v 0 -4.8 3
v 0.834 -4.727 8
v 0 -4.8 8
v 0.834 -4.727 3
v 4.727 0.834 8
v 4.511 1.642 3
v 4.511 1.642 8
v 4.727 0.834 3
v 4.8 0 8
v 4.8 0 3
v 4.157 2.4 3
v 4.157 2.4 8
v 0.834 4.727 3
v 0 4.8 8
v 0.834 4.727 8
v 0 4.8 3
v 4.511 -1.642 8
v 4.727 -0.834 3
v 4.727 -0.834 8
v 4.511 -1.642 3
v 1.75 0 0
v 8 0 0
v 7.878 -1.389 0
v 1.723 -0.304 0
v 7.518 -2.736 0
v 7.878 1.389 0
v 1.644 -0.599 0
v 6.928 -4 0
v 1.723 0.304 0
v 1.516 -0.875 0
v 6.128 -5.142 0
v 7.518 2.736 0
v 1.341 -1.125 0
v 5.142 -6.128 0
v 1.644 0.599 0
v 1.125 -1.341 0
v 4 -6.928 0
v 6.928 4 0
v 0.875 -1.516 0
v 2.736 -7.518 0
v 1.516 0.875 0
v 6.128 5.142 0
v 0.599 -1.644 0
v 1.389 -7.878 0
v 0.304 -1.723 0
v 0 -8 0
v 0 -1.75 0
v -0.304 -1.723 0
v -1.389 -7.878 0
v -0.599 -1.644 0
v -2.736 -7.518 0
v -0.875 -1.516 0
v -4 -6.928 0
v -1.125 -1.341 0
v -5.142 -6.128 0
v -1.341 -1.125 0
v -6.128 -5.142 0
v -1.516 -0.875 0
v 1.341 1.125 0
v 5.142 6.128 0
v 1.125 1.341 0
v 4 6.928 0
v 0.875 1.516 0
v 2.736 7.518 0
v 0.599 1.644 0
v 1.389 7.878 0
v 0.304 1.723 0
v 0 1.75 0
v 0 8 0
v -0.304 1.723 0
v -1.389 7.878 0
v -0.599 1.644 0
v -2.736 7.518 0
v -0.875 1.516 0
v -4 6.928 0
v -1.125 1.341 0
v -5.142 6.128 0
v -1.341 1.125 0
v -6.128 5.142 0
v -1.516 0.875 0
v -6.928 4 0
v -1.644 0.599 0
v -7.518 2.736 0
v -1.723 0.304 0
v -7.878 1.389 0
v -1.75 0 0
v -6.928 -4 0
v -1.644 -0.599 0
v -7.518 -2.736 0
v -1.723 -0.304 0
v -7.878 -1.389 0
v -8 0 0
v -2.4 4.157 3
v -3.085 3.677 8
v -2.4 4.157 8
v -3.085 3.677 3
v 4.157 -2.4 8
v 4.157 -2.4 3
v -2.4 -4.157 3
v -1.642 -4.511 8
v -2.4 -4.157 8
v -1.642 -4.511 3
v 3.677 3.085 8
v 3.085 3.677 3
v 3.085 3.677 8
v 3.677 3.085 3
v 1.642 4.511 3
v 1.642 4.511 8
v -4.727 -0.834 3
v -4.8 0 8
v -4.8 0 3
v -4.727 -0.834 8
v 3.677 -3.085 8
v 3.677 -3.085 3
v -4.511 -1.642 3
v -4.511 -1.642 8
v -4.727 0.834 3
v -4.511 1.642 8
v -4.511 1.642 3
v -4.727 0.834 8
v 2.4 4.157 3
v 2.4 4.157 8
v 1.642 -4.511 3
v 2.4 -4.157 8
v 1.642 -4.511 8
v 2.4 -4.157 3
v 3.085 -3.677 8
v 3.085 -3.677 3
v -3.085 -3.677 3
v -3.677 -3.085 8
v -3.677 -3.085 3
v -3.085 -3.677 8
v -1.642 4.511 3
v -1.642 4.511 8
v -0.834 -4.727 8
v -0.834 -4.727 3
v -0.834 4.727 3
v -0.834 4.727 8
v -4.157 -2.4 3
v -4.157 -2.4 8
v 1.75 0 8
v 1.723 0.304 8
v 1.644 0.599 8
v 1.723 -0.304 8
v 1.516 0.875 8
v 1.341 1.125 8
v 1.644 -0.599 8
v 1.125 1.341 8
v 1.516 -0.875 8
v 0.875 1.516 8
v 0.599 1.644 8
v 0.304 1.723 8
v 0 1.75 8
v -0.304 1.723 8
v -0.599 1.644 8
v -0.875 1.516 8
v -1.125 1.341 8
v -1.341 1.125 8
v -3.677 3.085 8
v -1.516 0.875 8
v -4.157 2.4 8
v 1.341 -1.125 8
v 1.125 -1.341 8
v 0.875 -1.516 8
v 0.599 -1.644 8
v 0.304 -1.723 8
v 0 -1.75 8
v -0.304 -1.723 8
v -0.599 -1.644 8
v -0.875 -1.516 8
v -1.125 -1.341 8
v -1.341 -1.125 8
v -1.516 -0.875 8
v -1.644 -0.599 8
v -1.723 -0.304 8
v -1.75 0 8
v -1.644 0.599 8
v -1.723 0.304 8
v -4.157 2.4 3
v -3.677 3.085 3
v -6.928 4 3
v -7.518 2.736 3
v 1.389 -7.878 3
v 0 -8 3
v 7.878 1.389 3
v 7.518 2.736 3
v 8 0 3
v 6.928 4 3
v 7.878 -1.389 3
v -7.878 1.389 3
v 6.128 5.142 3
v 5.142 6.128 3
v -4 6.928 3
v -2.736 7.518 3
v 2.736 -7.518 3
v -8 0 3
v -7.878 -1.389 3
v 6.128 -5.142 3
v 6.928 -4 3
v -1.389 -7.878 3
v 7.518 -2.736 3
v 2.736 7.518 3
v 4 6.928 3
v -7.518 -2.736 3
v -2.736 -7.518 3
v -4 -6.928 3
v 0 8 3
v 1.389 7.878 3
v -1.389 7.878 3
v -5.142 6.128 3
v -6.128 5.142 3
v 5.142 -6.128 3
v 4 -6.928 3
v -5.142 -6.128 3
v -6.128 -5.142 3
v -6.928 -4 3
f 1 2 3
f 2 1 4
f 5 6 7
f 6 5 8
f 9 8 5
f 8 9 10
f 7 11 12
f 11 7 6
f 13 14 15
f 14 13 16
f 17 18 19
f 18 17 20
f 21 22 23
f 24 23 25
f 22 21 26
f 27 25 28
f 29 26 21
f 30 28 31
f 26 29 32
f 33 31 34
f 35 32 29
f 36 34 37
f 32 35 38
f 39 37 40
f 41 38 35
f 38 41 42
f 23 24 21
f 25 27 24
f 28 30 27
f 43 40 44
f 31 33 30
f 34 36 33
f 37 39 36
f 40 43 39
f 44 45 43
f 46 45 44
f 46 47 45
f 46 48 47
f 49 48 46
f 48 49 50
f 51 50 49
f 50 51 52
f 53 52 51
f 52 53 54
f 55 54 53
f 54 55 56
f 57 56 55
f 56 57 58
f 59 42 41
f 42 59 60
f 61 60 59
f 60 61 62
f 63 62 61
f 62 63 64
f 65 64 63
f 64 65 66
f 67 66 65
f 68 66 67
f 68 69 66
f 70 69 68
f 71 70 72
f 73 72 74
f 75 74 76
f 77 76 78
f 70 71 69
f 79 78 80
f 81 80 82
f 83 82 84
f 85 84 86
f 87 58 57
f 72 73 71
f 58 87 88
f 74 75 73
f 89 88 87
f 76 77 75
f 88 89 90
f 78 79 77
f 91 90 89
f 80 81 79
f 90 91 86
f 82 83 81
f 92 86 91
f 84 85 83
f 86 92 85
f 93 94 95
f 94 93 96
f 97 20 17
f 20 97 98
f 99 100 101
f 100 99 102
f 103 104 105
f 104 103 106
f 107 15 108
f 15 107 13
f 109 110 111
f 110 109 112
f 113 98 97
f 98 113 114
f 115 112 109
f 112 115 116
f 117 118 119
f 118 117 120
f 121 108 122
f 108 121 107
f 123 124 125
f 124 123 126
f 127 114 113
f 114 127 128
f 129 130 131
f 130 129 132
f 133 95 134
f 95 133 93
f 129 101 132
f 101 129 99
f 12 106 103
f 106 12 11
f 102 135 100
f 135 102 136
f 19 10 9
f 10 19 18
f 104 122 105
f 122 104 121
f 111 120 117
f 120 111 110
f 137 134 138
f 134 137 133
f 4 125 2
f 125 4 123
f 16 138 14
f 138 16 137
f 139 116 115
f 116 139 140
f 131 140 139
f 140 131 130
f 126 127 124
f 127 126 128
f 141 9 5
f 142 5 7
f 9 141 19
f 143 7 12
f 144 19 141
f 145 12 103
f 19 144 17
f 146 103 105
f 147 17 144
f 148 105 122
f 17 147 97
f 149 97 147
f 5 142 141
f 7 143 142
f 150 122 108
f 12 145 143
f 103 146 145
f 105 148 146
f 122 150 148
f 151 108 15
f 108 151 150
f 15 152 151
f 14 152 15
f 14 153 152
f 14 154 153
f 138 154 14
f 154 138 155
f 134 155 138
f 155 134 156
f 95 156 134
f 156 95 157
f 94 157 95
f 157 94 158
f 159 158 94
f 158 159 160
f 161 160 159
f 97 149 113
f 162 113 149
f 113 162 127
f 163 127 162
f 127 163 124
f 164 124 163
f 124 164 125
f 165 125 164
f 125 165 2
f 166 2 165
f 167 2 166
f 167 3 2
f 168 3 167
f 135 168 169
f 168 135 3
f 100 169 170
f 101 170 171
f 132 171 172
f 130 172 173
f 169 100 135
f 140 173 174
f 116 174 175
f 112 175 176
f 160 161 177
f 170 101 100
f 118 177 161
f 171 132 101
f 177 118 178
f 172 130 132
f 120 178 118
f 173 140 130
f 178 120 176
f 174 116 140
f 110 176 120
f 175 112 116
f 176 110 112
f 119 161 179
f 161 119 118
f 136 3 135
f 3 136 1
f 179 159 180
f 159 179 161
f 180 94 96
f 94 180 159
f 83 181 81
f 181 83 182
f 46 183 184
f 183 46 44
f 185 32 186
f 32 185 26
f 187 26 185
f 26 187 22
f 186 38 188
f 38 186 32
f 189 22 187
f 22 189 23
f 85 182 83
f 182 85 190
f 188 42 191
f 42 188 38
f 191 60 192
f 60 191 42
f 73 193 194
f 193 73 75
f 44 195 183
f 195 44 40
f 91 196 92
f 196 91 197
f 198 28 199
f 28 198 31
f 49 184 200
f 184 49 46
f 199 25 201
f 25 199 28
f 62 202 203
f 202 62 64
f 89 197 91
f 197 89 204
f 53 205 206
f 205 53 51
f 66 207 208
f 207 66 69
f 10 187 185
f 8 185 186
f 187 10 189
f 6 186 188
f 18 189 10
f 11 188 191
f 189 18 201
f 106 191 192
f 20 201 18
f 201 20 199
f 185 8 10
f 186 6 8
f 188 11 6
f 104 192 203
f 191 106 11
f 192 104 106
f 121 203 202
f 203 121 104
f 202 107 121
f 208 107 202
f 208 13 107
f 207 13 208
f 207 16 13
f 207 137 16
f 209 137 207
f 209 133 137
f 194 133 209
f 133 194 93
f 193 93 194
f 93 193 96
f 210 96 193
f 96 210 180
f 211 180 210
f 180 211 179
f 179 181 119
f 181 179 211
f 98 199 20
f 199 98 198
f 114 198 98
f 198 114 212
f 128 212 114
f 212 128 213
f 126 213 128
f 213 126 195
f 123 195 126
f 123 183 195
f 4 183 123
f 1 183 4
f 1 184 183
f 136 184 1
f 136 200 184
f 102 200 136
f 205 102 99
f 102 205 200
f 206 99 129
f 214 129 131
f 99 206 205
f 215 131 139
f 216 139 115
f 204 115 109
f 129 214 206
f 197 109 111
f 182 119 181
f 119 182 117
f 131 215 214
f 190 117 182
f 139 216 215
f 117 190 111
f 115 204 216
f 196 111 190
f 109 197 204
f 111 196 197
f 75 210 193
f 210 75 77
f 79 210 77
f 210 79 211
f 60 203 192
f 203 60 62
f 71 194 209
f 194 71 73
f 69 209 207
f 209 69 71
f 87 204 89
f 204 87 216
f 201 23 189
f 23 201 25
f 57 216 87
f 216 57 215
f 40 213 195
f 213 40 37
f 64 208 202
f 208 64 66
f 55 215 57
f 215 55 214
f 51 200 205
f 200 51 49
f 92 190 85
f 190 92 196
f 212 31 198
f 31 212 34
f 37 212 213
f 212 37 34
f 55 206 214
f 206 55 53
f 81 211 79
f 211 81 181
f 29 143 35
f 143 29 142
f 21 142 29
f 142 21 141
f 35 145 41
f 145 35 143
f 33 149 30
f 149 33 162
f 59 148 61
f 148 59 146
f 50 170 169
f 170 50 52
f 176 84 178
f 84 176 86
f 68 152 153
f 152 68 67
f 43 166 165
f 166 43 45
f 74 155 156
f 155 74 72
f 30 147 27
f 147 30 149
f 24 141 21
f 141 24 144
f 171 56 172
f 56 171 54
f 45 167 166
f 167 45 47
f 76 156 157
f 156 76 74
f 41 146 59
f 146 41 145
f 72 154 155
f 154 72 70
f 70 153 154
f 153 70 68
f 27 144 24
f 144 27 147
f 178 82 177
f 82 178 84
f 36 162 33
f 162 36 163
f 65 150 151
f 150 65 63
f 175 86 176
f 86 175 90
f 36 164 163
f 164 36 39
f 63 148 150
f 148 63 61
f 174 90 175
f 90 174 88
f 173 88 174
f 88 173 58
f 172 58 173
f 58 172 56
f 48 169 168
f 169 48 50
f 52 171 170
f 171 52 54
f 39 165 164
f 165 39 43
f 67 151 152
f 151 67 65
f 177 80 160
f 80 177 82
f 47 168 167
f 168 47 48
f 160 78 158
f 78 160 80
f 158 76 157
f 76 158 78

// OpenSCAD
postDia = 9.6;
postHeight = 8;
shoulderDia = 16;
shoulderHeight = 3;
holeDia = 3.5;

difference() {
union() {
	cylinder($fn=36,r=postDia/2,h=postHeight);
	cylinder($fn=36,r=shoulderDia/2,h=shoulderHeight);
	//translate([-27,-17,0])
		//cube([54,34,2]);
}

cylinder($fn=36,r=holeDia/2,h=15);
}
